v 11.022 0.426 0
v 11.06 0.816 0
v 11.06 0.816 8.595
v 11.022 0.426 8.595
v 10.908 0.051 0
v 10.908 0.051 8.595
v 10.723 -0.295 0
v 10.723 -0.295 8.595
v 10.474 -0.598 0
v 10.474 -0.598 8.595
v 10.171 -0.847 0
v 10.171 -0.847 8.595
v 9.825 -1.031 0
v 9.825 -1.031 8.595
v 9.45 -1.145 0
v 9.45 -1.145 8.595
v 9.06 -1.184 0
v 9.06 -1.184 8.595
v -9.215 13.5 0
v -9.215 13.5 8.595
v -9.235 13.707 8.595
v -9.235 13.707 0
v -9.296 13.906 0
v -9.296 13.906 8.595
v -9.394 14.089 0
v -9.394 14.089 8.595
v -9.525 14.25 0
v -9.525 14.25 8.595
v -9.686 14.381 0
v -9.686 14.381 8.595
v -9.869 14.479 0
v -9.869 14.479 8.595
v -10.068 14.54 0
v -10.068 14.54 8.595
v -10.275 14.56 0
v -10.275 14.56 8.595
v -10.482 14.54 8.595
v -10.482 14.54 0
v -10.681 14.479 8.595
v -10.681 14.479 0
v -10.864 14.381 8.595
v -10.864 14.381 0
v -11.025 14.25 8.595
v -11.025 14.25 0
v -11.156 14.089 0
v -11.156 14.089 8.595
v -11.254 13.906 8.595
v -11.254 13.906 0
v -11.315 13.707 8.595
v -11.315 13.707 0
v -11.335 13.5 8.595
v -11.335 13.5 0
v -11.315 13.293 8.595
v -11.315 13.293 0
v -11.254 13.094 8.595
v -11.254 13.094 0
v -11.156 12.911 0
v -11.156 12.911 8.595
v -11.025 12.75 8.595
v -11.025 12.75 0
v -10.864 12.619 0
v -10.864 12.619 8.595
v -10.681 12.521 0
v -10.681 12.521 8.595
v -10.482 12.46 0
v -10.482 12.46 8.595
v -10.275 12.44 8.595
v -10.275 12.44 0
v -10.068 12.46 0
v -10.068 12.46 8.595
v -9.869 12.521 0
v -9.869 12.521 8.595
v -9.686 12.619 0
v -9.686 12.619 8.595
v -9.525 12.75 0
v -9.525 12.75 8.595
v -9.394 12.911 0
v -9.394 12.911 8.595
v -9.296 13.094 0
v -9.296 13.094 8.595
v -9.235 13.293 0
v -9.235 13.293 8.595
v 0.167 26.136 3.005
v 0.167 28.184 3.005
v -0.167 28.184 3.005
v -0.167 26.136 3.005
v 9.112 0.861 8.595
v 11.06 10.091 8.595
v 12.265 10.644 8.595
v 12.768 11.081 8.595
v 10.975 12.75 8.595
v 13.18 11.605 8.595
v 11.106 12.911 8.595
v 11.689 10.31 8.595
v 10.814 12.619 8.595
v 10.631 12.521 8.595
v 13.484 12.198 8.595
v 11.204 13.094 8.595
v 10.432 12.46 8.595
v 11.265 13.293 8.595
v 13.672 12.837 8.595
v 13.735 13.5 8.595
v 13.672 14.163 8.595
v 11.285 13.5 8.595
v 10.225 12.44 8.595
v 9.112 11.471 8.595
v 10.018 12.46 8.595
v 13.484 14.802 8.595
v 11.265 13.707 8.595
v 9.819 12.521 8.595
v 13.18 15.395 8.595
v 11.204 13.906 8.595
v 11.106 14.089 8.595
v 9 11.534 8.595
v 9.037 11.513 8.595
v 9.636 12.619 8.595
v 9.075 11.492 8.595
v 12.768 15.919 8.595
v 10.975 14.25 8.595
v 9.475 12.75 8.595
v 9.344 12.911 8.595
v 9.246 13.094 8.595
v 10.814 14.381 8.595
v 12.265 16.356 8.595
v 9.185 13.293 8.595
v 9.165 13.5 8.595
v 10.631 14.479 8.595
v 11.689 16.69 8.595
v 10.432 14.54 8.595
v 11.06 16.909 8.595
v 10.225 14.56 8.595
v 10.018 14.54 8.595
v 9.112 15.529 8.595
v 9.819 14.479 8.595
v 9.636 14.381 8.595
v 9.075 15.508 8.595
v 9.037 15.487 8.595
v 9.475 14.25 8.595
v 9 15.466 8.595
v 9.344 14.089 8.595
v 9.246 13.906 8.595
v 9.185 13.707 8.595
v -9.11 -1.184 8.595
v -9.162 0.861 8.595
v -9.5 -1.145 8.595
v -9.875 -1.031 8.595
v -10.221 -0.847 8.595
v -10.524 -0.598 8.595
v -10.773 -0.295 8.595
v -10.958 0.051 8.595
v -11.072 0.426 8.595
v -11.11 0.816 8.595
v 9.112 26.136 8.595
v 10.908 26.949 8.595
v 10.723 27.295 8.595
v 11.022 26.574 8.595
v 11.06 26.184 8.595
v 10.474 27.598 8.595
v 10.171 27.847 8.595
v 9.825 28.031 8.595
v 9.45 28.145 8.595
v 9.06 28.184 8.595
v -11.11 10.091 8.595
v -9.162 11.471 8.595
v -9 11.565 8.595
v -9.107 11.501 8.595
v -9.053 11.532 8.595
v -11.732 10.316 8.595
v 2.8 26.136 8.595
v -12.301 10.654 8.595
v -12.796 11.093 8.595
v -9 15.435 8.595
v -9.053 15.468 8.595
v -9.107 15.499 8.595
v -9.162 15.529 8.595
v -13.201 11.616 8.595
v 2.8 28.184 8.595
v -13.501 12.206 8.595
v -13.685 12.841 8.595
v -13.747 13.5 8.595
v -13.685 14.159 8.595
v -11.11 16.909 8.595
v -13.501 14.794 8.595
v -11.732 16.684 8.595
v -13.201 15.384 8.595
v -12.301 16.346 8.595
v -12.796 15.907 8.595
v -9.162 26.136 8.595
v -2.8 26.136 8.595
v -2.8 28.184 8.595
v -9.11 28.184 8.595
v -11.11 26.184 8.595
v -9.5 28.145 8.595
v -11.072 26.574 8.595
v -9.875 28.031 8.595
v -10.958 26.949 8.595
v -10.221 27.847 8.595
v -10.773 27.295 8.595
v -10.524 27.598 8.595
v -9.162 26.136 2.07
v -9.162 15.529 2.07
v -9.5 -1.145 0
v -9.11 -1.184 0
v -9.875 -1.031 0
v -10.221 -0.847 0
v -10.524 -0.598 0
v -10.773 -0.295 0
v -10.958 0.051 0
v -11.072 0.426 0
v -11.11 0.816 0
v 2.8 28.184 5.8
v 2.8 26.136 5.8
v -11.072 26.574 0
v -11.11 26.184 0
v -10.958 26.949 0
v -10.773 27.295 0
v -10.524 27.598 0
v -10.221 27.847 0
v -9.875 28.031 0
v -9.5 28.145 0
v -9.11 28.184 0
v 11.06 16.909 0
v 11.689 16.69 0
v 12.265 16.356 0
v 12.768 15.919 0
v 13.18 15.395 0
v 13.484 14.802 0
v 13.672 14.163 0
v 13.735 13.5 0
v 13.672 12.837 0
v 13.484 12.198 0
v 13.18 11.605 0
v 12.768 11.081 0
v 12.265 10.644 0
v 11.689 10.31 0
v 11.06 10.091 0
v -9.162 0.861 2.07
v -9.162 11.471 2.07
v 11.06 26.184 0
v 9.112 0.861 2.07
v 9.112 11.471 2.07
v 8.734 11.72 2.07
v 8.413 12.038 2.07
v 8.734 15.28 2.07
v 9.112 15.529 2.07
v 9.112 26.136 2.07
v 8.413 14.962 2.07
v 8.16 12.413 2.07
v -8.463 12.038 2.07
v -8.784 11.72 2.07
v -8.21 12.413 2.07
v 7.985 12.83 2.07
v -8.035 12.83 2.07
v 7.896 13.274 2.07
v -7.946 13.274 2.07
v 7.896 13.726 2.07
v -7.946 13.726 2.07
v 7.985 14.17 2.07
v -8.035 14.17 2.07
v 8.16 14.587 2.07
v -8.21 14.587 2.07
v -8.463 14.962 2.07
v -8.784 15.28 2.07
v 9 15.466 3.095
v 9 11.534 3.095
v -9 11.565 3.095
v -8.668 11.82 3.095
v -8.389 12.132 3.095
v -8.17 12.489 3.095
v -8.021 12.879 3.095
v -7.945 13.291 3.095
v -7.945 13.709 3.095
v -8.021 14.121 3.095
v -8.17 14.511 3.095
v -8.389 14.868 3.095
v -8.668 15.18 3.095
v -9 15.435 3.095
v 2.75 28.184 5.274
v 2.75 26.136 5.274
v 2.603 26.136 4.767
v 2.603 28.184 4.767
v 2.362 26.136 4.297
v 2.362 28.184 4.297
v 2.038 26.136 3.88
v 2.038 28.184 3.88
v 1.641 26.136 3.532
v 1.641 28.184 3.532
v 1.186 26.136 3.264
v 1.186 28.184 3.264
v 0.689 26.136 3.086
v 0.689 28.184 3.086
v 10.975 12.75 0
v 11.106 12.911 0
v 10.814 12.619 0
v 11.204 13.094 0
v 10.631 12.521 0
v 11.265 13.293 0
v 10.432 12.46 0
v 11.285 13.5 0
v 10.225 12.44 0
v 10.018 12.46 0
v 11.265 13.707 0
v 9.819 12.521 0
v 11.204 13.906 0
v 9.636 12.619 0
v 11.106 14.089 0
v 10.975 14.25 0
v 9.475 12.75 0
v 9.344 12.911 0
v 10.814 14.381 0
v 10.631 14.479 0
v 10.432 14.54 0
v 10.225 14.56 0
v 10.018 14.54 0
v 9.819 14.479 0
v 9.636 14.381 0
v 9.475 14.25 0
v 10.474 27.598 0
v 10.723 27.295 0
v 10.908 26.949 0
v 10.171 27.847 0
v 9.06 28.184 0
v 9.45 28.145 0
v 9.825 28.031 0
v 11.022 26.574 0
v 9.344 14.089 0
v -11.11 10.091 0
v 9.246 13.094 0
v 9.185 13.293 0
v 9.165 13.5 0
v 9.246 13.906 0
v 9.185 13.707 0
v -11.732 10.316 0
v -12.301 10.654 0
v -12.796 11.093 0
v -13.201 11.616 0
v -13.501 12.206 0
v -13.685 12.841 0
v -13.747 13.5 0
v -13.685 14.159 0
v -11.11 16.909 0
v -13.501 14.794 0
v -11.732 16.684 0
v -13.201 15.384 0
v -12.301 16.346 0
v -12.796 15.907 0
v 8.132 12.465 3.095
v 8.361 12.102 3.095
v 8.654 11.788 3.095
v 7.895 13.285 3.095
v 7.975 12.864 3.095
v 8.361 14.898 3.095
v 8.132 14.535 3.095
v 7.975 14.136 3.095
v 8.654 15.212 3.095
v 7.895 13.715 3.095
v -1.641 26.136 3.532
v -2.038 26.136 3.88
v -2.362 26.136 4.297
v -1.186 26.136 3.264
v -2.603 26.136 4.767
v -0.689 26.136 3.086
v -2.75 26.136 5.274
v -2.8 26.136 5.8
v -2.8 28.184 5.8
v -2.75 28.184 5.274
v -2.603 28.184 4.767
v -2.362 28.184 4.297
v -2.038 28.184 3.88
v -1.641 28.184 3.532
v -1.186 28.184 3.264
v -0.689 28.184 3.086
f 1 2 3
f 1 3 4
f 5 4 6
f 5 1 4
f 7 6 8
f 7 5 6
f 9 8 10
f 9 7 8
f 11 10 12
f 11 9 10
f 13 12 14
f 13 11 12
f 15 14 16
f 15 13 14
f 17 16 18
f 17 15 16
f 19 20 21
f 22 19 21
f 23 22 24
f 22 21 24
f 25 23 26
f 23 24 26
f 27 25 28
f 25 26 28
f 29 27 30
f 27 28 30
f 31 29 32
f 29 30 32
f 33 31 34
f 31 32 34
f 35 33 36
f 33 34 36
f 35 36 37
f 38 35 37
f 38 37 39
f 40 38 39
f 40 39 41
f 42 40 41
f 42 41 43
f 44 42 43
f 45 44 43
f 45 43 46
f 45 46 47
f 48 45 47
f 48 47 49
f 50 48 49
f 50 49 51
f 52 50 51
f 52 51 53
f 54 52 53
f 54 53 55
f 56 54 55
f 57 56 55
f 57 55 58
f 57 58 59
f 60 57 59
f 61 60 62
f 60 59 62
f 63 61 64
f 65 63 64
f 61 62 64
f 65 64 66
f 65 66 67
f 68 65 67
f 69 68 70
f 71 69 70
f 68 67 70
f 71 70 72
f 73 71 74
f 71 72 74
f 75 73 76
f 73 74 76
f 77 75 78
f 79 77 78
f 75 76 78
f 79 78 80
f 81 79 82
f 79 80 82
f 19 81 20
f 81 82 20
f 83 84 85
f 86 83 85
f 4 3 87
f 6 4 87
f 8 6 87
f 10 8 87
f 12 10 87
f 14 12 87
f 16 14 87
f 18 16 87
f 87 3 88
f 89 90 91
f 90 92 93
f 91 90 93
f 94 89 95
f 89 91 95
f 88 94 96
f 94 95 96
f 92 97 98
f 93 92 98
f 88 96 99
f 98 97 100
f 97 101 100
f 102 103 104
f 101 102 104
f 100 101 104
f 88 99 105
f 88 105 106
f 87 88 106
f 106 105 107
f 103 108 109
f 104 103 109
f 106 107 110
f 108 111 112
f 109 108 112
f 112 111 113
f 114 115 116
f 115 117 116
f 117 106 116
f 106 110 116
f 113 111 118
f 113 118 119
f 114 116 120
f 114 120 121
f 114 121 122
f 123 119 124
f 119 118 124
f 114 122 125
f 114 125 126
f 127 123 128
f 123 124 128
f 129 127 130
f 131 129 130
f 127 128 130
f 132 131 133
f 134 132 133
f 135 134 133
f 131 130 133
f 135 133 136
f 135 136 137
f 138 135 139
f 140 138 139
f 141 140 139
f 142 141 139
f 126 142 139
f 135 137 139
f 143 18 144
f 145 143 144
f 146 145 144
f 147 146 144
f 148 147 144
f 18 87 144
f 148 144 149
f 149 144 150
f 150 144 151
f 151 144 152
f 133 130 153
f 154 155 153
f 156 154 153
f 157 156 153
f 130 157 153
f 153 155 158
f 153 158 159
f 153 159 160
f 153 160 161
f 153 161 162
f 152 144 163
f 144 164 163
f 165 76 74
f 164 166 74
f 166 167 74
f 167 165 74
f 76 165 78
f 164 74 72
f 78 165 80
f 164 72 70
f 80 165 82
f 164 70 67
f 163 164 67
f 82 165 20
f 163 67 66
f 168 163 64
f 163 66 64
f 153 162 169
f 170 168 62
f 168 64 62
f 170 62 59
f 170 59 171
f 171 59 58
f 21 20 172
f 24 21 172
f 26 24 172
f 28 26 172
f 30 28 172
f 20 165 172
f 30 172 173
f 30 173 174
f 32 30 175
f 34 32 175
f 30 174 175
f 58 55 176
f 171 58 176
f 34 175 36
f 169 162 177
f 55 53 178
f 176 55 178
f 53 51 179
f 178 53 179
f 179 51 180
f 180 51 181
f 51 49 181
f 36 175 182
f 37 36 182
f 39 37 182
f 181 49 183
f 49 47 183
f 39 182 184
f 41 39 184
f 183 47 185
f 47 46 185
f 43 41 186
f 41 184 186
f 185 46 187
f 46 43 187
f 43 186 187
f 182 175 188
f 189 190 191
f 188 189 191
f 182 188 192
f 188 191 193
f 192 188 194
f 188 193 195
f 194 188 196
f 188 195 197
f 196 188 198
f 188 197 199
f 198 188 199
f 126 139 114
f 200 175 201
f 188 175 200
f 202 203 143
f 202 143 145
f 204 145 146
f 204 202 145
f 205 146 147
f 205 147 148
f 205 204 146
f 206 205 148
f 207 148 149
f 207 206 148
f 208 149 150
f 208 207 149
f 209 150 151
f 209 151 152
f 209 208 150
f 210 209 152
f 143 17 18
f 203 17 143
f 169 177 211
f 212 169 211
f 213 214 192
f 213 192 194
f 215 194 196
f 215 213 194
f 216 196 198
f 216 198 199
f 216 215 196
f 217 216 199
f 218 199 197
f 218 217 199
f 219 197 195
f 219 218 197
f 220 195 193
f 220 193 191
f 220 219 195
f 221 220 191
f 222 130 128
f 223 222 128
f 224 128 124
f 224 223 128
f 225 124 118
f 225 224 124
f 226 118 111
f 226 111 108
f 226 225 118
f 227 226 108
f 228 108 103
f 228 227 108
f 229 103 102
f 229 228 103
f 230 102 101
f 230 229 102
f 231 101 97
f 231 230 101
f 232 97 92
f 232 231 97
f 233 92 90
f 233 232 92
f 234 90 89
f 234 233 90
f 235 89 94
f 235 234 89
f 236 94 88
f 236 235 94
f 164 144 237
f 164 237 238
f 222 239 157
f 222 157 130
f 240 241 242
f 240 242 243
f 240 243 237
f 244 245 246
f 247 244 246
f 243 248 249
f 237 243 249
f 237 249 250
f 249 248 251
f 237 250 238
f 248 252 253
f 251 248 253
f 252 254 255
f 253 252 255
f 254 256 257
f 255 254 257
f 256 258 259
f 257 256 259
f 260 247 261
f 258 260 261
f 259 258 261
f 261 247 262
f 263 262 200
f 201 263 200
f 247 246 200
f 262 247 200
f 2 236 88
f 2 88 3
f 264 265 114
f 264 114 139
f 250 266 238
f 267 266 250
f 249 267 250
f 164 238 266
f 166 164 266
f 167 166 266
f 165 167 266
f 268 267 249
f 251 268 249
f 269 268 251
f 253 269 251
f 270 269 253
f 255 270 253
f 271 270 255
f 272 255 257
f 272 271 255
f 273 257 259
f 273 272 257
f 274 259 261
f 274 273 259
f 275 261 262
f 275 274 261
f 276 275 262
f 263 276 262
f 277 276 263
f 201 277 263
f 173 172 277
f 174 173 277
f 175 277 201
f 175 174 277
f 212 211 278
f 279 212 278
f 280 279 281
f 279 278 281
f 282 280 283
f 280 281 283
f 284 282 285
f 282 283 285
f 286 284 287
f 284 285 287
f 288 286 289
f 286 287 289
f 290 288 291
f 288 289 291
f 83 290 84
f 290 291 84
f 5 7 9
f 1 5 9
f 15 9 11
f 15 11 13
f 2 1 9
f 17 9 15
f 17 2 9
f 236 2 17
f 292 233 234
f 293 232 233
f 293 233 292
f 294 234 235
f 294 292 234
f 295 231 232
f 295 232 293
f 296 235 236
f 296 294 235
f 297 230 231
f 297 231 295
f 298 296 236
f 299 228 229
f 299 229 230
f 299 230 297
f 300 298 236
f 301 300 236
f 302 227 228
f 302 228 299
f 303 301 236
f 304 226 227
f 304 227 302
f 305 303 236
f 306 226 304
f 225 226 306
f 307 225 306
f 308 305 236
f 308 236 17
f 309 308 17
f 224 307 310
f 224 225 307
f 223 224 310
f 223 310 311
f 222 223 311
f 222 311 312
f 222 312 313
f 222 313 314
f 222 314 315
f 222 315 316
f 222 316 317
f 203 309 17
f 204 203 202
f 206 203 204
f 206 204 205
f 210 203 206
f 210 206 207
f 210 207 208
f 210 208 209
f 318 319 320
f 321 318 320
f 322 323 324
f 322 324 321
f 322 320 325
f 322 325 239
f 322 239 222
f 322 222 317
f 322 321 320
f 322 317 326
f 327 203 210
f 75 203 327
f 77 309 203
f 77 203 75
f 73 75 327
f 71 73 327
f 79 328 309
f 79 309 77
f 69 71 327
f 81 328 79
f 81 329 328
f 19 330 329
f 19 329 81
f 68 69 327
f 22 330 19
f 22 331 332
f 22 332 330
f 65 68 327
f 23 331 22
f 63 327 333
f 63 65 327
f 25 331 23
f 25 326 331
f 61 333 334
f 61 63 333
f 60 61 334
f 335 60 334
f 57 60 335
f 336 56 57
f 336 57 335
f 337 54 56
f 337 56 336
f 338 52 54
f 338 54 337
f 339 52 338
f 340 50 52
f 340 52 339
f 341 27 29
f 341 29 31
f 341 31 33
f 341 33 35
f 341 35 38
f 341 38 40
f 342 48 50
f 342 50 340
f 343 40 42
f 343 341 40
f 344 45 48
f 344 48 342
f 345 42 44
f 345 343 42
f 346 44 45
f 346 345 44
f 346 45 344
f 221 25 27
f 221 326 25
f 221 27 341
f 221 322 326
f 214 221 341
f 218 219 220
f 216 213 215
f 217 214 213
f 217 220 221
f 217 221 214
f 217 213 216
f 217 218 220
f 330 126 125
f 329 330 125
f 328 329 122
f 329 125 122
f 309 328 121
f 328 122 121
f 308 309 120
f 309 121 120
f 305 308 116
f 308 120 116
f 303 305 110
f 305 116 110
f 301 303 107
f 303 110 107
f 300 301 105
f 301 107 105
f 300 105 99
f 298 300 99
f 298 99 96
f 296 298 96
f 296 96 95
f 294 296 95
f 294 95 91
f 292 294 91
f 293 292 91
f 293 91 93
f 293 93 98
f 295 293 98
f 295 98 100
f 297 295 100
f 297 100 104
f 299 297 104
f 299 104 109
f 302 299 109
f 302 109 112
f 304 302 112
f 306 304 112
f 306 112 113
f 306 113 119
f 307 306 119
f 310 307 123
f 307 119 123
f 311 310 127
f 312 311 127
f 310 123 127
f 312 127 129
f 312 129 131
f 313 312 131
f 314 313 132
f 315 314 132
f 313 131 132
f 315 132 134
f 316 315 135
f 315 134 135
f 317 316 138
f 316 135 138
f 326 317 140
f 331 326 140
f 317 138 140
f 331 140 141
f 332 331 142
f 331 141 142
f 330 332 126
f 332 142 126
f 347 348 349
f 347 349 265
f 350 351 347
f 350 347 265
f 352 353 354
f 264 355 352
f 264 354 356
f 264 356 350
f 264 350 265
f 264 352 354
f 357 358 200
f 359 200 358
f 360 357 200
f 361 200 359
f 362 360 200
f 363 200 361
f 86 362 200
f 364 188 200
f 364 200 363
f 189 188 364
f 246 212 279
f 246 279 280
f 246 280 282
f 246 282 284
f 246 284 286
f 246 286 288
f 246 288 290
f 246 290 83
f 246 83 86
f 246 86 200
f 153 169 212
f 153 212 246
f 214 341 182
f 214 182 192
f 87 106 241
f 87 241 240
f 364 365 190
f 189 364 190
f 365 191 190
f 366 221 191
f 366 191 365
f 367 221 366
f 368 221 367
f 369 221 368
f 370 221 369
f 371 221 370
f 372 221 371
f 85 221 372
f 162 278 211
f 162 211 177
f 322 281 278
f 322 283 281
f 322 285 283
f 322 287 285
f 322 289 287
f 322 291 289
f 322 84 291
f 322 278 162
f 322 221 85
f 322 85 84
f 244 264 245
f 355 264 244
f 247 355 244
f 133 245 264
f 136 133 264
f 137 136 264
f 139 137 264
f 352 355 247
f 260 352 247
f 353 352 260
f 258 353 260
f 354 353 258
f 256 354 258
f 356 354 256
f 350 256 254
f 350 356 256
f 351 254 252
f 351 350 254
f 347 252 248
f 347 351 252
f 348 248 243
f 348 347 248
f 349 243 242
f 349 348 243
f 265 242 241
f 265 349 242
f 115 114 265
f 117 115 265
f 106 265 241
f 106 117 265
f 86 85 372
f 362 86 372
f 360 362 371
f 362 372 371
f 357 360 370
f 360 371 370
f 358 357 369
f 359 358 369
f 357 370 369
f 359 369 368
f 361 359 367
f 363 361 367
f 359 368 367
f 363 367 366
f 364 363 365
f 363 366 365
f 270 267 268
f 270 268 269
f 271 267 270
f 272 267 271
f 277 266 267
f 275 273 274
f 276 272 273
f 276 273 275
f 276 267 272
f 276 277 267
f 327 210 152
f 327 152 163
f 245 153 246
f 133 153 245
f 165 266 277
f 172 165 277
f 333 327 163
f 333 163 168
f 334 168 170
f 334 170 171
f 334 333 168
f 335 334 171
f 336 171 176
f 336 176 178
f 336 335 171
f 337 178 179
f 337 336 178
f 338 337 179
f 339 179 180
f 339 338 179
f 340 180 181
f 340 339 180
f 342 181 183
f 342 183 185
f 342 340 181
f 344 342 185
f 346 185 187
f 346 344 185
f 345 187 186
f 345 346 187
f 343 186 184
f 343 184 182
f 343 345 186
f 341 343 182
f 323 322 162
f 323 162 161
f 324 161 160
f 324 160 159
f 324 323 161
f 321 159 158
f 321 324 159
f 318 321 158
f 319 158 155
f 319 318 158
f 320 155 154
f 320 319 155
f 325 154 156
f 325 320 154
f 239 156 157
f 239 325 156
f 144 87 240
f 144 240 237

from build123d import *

# Parameters (mm, degrees)
BOSS_EXTRUDE2_DEPTH = 8.595
CUT_EXTRUDE3_REACH  = 34.514
SKETCH5_R           = 1.06
CUT_EXTRUDE4_DEPTH  = 6.525
CUT_EXTRUDE2_REACH  = 35.545
SKETCH7_W           = 18
SKETCH7_H           = 24.65
CUT_EXTRUDE6_DEPTH  = 5.5


with BuildPart() as part:
    # Sketch1 → Boss-Extrude2 (new body)
    with BuildSketch(Plane.XY):
        with BuildLine():
            Line((-11.11, 0.816412174), (-11.11, 10.090766215))
            ThreePointArc((-11.11, 10.090766215), (-13.747229408, 13.5), (-11.11, 16.909233785))
            Line((-11.11, 16.909233785), (-11.11, 26.183587826))
            ThreePointArc((-11.11, 26.183587826), (-10.524213562, 27.597801388), (-9.11, 28.183587826))
            Line((-9.11, 28.183587826), (9.06, 28.183587826))
            ThreePointArc((9.06, 28.183587826), (10.474213562, 27.597801388), (11.06, 26.183587826))
            Line((11.06, 26.183587826), (11.06, 16.909233785))
            ThreePointArc((11.06, 16.909233785), (13.735, 13.5), (11.06, 10.090766215))
            Line((11.06, 10.090766215), (11.06, 0.816412174))
            ThreePointArc((11.06, 0.816412174), (10.474213562, -0.597801388), (9.06, -1.183587826))
            Line((9.06, -1.183587826), (-9.11, -1.183587826))
            ThreePointArc((-9.11, -1.183587826), (-10.524213562, -0.597801388), (-11.11, 0.816412174))
        make_face()
    extrude(amount=BOSS_EXTRUDE2_DEPTH)

    # Sketch5 → Cut-Extrude3 (cut, up to next)
    with BuildSketch(Plane.XY.offset(8.595), mode=Mode.PRIVATE) as cut_extrude3_sk1:
        with Locations((-10.275, 13.5)):
            Circle(SKETCH5_R)
    cut_extrude3_tool1 = extrude(cut_extrude3_sk1.sketch, amount=-CUT_EXTRUDE3_REACH, mode=Mode.PRIVATE) & part.part
    # Sketch5 → Cut-Extrude3 (cut, up to next)
    with BuildSketch(Plane.XY.offset(8.595), mode=Mode.PRIVATE) as cut_extrude3_sk2:
        with Locations(Location((10.225, 13.5, 0), (0, 0, 180))):
            Circle(SKETCH5_R)
    cut_extrude3_tool2 = extrude(cut_extrude3_sk2.sketch, amount=-CUT_EXTRUDE3_REACH, mode=Mode.PRIVATE) & part.part
    add(cut_extrude3_tool1.solids().sort_by_distance((-10.275, 13.5, 8.595))[0], mode=Mode.SUBTRACT)
    add(cut_extrude3_tool2.solids().sort_by_distance((10.225, 13.5, 8.595))[0], mode=Mode.SUBTRACT)

    # Sketch2 → Cut-Extrude4 (cut)
    with BuildSketch(Plane.XY.offset(8.595)):
        with BuildLine():
            Line((-9.1625, 15.528570386), (-9.1625, 26.136412174))
            Line((-9.1625, 26.136412174), (9.1125, 26.136412174))
            Line((9.1125, 26.136412174), (9.1125, 15.528570386))
            ThreePointArc((9.1125, 15.528570386), (7.885020948, 13.5), (9.1125, 11.471429614))
            Line((9.1125, 11.471429614), (9.1125, 0.861412174))
            Line((9.1125, 0.861412174), (-9.1625, 0.861412174))
            Line((-9.1625, 0.861412174), (-9.1625, 11.471429614))
            ThreePointArc((-9.1625, 11.471429614), (-7.935020948, 13.5), (-9.1625, 15.528570386))
        make_face()
    extrude(amount=-CUT_EXTRUDE4_DEPTH, mode=Mode.SUBTRACT)

    # Sketch3 → Cut-Extrude2 (cut, up to next)
    with BuildSketch(Plane(origin=(0, 28.183587826, 0), x_dir=(1, 0, 0), z_dir=(0, 1, 0)), mode=Mode.PRIVATE) as cut_extrude2_sk1:
        with BuildLine():
            Line((0.167257287, -3.005), (-0.167257287, -3.005))
            ThreePointArc((-0.167257287, -3.005), (-2.038175704, -3.880145891), (-2.8, -5.8))
            Line((-2.8, -5.8), (-2.8, -8.595))
            Line((-2.8, -8.595), (-0.167257287, -8.595))
            Line((-0.167257287, -8.595), (0.167257287, -8.595))
            Line((0.167257287, -8.595), (2.8, -8.595))
            Line((2.8, -8.595), (2.8, -5.8))
            ThreePointArc((2.8, -5.8), (2.038175704, -3.880145891), (0.167257287, -3.005))
        make_face()
    cut_extrude2_tool1 = extrude(cut_extrude2_sk1.sketch, amount=-CUT_EXTRUDE2_REACH, mode=Mode.PRIVATE) & part.part
    add(cut_extrude2_tool1.solids().sort_by_distance((0, 28.183588, 6.058962))[0], mode=Mode.SUBTRACT)

    # Sketch7 → Cut-Extrude6 (cut)
    with BuildSketch(Plane.XY.offset(8.595)):
        with Locations((0, 13.548319596)):
            Rectangle(SKETCH7_W, SKETCH7_H)
    extrude(amount=-CUT_EXTRUDE6_DEPTH, mode=Mode.SUBTRACT)


solid = part.part
